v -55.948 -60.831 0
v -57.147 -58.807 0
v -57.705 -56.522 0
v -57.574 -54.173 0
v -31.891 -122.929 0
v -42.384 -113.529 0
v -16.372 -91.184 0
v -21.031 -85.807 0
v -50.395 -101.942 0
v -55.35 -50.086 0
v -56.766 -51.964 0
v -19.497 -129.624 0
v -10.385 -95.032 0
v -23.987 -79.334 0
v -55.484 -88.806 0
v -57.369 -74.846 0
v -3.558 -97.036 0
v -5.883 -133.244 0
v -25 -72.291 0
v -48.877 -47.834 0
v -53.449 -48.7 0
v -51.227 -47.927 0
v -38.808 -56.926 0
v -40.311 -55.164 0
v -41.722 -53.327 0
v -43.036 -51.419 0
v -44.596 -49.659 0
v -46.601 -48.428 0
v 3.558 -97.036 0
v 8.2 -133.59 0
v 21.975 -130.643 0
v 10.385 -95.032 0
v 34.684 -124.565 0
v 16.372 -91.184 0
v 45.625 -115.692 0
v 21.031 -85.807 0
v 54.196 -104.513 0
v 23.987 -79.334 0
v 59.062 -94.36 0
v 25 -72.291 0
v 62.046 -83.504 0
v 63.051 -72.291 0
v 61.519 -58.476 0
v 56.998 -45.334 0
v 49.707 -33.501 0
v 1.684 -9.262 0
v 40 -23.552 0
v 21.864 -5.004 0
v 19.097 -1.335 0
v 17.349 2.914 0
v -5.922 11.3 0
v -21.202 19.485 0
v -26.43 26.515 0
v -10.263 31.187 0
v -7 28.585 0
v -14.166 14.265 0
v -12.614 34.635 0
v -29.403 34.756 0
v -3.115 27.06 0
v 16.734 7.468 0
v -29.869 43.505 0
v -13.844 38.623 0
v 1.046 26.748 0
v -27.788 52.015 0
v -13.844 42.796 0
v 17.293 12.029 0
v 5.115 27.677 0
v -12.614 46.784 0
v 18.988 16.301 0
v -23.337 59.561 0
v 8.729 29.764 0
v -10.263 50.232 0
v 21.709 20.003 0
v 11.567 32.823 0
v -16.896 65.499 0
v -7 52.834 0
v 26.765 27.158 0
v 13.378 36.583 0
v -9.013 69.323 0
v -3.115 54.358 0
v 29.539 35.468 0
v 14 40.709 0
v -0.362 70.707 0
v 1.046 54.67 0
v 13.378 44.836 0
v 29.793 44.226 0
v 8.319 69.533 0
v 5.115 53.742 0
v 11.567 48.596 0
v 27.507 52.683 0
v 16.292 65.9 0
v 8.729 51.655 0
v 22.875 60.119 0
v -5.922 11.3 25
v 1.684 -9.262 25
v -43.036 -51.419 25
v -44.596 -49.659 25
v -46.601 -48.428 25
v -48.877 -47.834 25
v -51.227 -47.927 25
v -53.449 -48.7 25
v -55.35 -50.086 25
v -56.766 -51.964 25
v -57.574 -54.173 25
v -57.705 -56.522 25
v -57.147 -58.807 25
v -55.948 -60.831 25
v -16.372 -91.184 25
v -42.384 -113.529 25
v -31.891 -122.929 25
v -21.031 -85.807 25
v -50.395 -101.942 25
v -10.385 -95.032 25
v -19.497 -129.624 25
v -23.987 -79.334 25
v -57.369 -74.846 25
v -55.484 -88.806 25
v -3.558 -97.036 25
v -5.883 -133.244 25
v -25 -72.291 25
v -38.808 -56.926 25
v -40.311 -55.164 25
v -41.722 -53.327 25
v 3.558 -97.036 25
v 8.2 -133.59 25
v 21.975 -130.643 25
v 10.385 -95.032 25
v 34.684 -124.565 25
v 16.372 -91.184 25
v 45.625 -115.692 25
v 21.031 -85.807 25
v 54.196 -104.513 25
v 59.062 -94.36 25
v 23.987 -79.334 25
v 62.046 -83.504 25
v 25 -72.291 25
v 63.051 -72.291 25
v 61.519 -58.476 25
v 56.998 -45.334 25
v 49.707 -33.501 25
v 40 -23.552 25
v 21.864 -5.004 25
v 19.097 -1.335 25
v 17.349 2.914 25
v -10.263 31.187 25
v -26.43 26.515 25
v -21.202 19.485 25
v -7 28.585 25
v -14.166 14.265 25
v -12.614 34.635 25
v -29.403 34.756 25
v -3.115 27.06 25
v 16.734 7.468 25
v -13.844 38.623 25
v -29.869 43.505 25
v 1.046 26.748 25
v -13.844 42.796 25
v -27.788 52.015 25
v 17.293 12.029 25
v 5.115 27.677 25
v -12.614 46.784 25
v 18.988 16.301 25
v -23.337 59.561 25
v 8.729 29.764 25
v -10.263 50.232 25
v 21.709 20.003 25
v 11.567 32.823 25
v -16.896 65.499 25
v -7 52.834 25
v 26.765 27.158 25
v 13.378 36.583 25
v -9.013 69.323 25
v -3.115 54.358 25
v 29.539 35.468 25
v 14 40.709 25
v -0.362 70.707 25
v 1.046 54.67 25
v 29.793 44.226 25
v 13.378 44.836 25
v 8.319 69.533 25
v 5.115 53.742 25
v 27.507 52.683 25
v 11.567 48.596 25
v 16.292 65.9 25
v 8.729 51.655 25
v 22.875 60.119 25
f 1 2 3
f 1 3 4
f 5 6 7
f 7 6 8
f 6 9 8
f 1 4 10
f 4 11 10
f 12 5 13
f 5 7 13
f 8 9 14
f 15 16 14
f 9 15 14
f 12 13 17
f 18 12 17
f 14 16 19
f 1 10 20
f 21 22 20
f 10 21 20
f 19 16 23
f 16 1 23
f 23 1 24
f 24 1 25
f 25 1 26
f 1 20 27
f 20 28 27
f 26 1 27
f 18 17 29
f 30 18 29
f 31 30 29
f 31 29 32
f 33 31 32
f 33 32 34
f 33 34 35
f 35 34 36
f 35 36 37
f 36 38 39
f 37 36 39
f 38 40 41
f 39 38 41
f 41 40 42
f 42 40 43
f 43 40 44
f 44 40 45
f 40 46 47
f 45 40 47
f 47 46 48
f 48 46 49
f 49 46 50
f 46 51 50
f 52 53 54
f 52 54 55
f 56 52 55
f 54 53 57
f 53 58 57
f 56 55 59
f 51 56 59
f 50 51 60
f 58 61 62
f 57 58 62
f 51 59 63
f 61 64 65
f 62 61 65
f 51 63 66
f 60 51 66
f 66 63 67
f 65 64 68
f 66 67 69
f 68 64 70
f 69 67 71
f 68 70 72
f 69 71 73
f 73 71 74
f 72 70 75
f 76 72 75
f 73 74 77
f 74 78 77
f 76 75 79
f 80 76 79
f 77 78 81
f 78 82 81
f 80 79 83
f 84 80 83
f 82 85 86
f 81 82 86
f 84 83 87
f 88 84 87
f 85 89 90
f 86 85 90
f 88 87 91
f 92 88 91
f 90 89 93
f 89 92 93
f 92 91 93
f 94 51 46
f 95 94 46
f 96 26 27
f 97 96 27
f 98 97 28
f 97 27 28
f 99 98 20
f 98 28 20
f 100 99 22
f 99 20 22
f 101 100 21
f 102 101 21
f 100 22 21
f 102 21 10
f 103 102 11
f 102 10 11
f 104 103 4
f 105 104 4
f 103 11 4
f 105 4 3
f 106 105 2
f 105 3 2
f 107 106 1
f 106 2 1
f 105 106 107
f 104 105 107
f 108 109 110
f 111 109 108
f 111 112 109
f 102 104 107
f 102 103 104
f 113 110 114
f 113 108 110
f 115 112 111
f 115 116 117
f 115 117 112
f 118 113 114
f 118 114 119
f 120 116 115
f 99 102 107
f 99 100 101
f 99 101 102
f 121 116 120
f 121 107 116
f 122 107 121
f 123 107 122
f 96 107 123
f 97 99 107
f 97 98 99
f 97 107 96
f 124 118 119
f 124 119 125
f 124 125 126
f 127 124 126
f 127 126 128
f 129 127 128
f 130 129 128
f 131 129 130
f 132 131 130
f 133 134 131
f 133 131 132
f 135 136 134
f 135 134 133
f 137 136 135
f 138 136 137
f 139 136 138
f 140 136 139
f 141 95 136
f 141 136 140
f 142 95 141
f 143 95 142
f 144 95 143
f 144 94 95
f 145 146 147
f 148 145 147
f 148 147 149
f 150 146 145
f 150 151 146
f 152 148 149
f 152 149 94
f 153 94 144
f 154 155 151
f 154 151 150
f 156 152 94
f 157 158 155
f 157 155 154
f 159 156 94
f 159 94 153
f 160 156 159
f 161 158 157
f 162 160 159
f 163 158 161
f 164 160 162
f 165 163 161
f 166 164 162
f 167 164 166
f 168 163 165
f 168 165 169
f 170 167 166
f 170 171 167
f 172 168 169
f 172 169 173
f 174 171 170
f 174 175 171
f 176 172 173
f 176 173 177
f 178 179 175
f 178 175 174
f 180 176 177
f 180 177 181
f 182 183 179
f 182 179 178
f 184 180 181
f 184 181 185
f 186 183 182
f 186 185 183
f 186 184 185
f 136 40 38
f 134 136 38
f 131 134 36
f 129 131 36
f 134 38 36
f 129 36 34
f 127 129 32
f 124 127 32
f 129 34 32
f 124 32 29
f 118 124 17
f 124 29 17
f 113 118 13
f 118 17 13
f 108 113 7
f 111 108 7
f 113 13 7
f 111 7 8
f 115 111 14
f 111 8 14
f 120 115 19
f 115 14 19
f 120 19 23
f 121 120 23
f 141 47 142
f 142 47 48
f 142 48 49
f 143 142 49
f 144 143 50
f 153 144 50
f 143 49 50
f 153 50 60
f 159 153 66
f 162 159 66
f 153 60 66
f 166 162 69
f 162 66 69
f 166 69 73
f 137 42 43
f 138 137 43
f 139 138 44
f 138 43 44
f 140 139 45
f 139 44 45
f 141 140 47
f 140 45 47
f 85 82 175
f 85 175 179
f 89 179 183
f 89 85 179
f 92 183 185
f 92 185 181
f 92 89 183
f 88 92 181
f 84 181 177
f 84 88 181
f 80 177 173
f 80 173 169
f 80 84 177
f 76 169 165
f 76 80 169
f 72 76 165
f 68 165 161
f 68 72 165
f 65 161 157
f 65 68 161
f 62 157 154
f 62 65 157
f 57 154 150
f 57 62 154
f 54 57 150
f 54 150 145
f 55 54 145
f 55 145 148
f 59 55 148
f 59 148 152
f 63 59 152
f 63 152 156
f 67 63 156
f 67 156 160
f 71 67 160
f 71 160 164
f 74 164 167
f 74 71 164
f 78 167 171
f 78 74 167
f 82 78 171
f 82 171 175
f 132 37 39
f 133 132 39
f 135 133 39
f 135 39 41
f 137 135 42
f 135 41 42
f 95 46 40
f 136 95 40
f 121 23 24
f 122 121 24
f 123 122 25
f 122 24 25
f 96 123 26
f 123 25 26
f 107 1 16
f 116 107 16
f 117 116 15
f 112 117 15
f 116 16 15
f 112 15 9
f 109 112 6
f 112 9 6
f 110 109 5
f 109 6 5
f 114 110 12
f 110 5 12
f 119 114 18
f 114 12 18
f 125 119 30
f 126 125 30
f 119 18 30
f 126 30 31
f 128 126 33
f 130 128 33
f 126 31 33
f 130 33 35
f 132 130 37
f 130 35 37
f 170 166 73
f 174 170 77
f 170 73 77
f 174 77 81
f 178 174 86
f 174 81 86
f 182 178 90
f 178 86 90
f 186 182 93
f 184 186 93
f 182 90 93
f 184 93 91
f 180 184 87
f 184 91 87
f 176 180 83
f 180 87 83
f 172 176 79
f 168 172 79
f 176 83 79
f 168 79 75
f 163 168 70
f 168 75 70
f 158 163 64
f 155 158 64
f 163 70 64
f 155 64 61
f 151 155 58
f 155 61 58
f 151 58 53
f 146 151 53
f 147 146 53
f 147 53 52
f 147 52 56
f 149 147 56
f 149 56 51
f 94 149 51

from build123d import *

# Parameters (mm, degrees)
F0_R     = 14
F1_DEPTH = 25


with BuildPart() as f1:
    # F0 (on Top) → F1 (new body)
    with BuildSketch(Plane.XY):
        with BuildLine():
            ThreePointArc((21.863849, -5.004198), (16.734289, 7.468286), (21.708714, 20.003449))
            ThreePointArc((21.708714, 20.003449), (-9.013445, 69.323231), (-5.922247, 11.299646))
            Line((-5.922247, 11.299646), (1.68415, -9.262297))
            Line((1.68415, -9.262297), (25, -72.290713))
            ThreePointArc((25, -72.290713), (0, -97.290713), (-25, -72.290713))
            Line((-25, -72.290713), (-38.807588, -56.926059))
            ThreePointArc((-38.807588, -56.926059), (-41.028289, -54.254293), (-43.036256, -51.419171))
            ThreePointArc((-43.036256, -51.419171), (-54.45074, -49.322706), (-55.948149, -60.831111))
            ThreePointArc((-55.948149, -60.831111), (-19.496759, -129.623891), (54.195657, -104.512574))
            ThreePointArc((54.195657, -104.512574), (60.796806, -88.998974), (63.050913, -72.290713))
            ThreePointArc((63.050913, -72.290713), (56.997606, -45.333515), (40, -23.552457))
            Line((40, -23.552457), (21.863849, -5.004198))
        make_face()
        with Locations((0, 40.709287)):
            Circle(F0_R, mode=Mode.SUBTRACT)
    extrude(amount=F1_DEPTH)


solid = f1.part
